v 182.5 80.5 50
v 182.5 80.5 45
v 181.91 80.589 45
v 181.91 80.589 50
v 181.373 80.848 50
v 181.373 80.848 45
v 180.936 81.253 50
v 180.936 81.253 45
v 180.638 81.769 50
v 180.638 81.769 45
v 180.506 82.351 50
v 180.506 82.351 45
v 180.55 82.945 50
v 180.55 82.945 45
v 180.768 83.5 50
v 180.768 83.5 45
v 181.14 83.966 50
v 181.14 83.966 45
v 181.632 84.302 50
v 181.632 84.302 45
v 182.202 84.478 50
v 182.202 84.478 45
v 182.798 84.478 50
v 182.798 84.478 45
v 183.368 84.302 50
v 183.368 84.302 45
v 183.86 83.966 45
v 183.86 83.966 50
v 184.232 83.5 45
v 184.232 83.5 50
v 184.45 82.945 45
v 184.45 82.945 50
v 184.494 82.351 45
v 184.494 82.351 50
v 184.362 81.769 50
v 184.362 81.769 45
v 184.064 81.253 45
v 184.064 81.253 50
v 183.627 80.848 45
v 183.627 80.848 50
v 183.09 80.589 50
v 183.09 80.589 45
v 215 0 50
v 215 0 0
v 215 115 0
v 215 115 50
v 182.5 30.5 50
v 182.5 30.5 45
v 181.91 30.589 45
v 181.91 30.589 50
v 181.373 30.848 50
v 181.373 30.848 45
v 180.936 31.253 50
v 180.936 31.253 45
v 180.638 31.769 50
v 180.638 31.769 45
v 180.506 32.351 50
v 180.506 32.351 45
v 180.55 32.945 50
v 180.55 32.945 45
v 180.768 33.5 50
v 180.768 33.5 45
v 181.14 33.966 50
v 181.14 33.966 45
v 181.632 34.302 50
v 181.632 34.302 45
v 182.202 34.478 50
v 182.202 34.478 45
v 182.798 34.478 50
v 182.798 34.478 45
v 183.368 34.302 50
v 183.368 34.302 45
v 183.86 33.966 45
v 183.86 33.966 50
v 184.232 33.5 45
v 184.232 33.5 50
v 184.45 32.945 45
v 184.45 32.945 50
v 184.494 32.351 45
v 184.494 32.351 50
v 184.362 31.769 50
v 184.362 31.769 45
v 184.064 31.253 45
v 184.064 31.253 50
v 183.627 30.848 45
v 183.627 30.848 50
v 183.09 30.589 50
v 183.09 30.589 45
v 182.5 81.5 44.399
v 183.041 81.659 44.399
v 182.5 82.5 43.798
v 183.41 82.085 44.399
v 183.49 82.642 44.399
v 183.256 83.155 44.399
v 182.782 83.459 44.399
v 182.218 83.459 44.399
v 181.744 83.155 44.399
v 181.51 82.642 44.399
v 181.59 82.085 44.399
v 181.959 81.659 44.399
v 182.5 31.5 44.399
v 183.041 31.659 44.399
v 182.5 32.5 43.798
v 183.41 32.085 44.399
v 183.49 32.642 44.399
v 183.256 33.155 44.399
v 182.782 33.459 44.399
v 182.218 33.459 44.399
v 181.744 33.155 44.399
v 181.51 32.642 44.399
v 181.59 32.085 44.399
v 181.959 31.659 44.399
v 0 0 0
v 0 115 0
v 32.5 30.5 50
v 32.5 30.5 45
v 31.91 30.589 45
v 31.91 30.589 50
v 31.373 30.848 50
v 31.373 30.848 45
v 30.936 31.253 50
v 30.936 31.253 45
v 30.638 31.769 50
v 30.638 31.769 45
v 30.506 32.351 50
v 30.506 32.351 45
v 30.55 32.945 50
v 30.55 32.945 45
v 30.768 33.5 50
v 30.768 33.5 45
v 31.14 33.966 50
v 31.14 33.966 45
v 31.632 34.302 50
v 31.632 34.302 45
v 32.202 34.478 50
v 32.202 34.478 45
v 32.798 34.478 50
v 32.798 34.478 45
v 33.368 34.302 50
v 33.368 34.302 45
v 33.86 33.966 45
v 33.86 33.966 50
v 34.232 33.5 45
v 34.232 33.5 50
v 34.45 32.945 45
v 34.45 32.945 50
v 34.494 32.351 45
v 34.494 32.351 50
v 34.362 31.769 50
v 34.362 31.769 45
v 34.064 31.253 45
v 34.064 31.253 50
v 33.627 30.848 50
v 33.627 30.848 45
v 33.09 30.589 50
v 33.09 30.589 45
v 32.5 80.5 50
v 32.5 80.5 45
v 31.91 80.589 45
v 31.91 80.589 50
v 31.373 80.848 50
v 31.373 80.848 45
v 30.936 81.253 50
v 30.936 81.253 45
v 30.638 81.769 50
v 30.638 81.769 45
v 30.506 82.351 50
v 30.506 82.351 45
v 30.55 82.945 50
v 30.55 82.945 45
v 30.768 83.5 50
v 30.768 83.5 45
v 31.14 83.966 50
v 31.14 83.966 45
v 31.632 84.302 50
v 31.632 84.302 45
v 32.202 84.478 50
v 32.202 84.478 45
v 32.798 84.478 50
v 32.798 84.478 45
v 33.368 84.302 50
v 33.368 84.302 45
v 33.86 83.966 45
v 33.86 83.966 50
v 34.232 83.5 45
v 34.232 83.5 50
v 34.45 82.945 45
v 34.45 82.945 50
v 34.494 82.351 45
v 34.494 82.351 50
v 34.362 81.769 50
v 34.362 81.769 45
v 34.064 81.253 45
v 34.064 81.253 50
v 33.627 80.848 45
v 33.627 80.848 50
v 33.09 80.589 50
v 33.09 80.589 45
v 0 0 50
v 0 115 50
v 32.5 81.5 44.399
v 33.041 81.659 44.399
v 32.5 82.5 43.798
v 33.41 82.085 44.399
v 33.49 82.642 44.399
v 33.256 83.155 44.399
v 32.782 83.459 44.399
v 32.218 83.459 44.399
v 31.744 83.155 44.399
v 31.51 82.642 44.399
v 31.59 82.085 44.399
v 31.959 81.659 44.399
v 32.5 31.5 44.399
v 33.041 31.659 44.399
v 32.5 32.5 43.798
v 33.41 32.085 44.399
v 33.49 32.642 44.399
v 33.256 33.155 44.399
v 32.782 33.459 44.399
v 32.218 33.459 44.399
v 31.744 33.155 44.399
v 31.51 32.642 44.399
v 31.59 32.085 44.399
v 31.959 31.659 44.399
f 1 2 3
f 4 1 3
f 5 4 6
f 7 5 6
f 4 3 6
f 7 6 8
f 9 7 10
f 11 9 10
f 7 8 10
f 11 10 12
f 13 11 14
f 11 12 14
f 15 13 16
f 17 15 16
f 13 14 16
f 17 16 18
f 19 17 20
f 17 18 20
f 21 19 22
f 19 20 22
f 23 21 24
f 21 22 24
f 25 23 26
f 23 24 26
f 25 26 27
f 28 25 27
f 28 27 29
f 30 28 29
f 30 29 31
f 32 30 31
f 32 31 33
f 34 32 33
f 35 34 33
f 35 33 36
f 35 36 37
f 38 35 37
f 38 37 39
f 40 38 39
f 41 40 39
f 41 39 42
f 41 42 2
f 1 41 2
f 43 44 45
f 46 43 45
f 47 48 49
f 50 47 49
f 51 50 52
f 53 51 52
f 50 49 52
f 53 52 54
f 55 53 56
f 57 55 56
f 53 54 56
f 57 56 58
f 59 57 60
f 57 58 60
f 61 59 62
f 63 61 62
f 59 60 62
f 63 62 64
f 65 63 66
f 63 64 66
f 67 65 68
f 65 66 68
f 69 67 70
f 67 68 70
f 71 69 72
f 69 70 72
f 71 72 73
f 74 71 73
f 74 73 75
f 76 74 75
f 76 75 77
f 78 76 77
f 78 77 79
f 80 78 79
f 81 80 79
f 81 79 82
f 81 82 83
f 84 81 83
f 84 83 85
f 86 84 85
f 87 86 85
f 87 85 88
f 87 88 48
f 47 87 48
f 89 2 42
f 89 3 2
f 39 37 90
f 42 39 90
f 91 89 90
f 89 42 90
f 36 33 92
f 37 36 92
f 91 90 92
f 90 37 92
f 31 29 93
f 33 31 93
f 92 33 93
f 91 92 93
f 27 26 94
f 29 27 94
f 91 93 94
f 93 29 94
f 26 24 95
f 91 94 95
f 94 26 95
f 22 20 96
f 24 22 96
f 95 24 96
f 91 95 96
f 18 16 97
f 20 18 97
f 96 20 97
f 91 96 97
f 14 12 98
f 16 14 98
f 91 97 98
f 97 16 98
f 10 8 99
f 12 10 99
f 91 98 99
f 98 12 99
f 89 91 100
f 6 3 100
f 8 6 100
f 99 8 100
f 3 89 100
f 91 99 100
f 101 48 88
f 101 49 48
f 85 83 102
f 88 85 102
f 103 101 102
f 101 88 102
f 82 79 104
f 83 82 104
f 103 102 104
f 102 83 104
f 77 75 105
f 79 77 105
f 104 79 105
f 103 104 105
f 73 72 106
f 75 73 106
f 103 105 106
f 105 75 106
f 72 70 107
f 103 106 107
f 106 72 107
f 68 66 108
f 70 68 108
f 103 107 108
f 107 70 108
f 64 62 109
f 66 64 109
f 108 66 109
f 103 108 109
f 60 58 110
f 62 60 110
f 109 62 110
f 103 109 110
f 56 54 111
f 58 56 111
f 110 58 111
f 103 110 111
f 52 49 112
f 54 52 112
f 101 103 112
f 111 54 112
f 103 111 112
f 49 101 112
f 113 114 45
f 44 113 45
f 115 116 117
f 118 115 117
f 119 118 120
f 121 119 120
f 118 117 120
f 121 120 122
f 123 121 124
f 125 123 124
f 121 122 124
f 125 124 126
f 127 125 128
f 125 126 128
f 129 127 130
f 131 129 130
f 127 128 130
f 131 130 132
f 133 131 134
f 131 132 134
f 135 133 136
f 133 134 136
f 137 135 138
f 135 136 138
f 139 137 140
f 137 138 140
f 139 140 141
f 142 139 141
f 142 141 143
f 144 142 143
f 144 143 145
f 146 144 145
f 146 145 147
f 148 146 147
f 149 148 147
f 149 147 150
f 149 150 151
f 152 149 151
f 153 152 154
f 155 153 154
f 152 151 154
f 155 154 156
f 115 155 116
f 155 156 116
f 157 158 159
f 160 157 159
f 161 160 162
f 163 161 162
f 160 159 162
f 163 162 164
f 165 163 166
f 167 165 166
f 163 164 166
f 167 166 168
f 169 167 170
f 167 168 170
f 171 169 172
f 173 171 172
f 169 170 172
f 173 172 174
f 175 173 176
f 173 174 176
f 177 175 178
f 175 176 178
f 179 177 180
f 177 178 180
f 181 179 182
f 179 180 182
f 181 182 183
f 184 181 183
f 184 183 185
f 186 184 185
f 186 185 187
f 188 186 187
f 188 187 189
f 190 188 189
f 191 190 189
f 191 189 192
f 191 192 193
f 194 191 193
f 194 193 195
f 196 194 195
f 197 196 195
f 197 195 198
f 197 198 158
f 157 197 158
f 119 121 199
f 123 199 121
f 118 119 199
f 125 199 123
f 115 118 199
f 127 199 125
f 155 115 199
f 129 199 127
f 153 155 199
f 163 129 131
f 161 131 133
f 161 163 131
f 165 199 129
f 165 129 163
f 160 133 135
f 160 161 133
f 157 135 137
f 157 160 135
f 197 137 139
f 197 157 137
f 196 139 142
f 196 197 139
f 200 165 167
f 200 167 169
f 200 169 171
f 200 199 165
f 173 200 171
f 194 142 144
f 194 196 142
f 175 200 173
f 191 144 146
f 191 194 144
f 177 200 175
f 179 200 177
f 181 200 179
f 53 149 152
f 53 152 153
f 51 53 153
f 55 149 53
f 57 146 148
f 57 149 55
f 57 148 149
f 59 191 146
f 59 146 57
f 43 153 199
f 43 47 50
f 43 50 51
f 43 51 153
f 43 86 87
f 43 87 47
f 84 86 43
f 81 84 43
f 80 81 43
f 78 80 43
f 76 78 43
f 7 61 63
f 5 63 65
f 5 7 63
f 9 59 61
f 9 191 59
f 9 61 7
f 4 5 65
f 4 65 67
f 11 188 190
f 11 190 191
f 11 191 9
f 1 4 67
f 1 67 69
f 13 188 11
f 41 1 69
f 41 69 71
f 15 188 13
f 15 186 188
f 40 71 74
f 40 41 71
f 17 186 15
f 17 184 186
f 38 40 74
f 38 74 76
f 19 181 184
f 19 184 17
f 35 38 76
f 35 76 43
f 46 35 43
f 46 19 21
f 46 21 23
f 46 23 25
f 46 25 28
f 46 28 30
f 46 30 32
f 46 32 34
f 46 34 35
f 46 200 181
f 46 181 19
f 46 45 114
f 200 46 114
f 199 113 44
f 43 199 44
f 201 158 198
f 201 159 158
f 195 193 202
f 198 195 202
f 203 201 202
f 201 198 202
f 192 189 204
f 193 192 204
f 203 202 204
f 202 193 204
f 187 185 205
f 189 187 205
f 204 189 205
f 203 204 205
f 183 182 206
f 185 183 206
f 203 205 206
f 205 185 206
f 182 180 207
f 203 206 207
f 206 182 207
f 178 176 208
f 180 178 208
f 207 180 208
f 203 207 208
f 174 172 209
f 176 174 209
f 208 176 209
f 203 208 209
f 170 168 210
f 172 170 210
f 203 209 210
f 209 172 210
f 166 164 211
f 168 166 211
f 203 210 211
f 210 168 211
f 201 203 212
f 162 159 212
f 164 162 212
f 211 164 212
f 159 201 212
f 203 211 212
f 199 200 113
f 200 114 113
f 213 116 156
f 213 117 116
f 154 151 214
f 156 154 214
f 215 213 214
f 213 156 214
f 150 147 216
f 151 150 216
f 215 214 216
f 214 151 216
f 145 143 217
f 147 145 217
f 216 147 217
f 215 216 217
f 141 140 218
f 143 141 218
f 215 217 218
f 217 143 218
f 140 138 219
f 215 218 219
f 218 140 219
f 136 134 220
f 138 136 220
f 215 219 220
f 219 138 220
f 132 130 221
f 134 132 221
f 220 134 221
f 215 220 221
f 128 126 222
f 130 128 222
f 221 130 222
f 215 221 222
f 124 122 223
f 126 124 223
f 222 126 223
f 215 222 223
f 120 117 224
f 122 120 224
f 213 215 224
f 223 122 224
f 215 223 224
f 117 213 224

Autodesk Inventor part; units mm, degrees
ref_plane "YZ Plane" through (0, 0, 0) normal (1, 0, 0) x (0, 1, 0)
ref_plane "XZ Plane" through (0, 0, 0) normal (0, 1, 0) x (-1, 0, 0)
ref_plane "XY Plane" through (0, 0, 0) normal (0, 0, 1) x (1, 0, 0)
sketch "Sketch1" plane through (0, 0, 0) normal (0, 0, 1) x (1, 0, 0)
  line L0 (0, 0) -> (215, 0)
  line L1 (215, 0) -> (215, 115)
  line L2 (215, 115) -> (0, 115)
  line L3 (0, 115) -> (0, 0)
  dimension "d0" = 215
  dimension "d2" = 115
extrude "Extrusion1" add sketch "Sketch1" along normal blind 50
sketch "Sketch2" plane through (0, 0, 50) normal (0, 0, 1) x (1, 0, 0)
  line L0 (215, 0) -> (215, 115) projected
  line L1 (215, 115) -> (0, 115) projected
  line L2 (32.5, 82.5) -> (182.5, 82.5)
  line L3 (182.5, 82.5) -> (182.5, 32.5)
  line L4 (182.5, 32.5) -> (32.5, 32.5)
  line L5 (32.5, 32.5) -> (32.5, 82.5)
  point P0 (107.5, 82.5)
  point P1 (107.5, 115)
  point P2 (182.5, 57.5)
  point P3 (215, 57.5)
  dimension "d5" = 150
  dimension "d7" = 50
hole "Hole1" at (32.5, 82.5, 50) at (32.5, 32.5, 50) at (182.5, 32.5, 50) at (182.5, 82.5, 50) direction (0, 0, -1) diameter 4 depth 5 tip angle 118
ref_plane "Work Plane1" through (107.5, 0, 0) normal (1, 0, 0) x (0, 0, -1)
properties part number "power supply"
